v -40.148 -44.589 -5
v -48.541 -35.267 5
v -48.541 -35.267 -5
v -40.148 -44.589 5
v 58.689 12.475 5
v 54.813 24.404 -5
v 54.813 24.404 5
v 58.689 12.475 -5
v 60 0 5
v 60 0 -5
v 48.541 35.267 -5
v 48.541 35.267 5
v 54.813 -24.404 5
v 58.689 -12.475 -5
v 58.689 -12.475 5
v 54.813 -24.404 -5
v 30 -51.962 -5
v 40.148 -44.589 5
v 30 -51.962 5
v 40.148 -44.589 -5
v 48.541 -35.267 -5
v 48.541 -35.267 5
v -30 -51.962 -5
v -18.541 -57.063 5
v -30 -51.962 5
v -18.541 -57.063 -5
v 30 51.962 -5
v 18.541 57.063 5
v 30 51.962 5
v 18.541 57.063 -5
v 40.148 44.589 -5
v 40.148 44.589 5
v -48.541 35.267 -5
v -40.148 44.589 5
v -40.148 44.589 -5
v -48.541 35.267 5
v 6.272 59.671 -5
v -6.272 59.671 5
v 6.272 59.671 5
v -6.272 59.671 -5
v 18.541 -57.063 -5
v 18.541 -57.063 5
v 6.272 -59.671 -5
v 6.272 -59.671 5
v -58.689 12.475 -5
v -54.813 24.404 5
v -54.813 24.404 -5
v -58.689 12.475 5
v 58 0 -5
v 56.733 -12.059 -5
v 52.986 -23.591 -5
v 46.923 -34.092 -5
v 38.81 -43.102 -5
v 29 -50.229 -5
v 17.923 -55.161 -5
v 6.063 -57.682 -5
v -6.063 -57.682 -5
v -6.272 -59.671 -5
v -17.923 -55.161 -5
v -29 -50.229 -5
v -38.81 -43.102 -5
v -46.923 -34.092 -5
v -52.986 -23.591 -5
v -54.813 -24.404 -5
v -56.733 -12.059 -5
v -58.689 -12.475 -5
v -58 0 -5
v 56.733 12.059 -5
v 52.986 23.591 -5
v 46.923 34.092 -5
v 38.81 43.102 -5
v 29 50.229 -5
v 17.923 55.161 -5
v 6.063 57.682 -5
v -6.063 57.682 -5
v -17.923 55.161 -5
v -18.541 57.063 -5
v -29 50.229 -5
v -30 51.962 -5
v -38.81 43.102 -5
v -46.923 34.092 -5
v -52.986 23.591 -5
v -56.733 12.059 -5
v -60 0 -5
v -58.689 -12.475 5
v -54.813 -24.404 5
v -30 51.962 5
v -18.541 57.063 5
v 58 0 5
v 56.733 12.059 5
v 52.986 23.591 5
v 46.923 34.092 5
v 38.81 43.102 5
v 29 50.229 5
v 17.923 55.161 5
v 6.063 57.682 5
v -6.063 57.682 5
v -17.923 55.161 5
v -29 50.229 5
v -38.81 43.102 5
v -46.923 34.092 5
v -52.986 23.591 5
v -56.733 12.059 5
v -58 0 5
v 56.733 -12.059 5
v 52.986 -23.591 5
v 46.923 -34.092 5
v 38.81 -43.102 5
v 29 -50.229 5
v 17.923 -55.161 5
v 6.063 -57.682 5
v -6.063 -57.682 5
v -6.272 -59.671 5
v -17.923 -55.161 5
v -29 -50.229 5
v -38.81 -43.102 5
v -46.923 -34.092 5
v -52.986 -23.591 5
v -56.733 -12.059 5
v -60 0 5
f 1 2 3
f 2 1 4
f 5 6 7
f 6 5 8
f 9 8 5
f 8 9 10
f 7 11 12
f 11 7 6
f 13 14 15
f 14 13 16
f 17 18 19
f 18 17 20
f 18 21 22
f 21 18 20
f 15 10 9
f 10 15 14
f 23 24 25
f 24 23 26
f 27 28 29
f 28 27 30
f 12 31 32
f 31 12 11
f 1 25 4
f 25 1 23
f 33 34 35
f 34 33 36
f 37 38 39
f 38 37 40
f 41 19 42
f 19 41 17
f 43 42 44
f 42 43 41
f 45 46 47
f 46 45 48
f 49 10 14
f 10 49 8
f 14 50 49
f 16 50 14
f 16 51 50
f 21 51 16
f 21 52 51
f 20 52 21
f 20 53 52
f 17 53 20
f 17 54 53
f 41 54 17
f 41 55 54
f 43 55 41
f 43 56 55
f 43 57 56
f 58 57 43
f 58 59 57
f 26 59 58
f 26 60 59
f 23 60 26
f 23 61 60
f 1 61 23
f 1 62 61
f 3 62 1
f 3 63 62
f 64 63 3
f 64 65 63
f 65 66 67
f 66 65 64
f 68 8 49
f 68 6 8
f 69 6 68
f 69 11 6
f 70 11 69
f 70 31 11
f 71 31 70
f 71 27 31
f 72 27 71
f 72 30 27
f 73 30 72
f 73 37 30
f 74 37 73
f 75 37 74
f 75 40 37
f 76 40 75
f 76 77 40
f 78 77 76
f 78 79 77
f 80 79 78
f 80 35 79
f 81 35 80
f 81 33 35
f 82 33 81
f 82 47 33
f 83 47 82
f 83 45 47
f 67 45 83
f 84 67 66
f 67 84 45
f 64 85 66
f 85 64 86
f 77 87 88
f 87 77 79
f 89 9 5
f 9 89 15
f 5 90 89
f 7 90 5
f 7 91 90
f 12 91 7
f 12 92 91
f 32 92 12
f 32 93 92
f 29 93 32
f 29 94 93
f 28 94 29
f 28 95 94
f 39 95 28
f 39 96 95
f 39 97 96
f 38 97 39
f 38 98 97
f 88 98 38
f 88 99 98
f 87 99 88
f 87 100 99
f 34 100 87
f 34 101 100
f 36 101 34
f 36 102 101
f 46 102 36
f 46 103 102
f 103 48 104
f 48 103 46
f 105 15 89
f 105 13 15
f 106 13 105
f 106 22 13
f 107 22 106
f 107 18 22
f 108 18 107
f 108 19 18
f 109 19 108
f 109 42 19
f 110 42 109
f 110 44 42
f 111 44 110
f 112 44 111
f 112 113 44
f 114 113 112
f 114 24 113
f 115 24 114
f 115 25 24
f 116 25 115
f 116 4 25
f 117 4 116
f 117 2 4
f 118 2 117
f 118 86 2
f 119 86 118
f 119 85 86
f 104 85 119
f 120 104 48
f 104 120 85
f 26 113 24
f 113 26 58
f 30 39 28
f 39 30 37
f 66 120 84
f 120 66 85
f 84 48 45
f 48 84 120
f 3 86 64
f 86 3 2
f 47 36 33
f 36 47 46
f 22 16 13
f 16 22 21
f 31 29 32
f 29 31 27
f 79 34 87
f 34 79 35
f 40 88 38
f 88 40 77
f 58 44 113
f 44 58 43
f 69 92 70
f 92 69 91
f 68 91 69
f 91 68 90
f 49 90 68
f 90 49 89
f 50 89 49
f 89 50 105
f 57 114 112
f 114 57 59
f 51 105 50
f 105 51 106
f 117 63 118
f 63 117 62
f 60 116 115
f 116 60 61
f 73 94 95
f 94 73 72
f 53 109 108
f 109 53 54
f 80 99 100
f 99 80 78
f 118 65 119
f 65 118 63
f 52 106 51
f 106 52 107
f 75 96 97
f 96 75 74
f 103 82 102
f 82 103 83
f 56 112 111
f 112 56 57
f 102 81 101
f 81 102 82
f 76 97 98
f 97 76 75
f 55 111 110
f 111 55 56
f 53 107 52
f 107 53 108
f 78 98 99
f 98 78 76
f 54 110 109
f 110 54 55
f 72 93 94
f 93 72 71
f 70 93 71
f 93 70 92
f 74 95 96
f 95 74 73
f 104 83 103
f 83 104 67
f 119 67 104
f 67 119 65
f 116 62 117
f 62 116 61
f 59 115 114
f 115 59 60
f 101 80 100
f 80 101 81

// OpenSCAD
//radius = 10;
module hexagon(radius) {
    difference() {
        cylinder(r= radius, h = 3, $fn=6, center = true);
        cylinder(r= radius -1, h = 3.1, $fn=6, center = true);
    }
}



difference(){
    cylinder(r = 60, h = 10, center = true);
    cylinder(r = 58, h = 10.2, center = true);
}
  
